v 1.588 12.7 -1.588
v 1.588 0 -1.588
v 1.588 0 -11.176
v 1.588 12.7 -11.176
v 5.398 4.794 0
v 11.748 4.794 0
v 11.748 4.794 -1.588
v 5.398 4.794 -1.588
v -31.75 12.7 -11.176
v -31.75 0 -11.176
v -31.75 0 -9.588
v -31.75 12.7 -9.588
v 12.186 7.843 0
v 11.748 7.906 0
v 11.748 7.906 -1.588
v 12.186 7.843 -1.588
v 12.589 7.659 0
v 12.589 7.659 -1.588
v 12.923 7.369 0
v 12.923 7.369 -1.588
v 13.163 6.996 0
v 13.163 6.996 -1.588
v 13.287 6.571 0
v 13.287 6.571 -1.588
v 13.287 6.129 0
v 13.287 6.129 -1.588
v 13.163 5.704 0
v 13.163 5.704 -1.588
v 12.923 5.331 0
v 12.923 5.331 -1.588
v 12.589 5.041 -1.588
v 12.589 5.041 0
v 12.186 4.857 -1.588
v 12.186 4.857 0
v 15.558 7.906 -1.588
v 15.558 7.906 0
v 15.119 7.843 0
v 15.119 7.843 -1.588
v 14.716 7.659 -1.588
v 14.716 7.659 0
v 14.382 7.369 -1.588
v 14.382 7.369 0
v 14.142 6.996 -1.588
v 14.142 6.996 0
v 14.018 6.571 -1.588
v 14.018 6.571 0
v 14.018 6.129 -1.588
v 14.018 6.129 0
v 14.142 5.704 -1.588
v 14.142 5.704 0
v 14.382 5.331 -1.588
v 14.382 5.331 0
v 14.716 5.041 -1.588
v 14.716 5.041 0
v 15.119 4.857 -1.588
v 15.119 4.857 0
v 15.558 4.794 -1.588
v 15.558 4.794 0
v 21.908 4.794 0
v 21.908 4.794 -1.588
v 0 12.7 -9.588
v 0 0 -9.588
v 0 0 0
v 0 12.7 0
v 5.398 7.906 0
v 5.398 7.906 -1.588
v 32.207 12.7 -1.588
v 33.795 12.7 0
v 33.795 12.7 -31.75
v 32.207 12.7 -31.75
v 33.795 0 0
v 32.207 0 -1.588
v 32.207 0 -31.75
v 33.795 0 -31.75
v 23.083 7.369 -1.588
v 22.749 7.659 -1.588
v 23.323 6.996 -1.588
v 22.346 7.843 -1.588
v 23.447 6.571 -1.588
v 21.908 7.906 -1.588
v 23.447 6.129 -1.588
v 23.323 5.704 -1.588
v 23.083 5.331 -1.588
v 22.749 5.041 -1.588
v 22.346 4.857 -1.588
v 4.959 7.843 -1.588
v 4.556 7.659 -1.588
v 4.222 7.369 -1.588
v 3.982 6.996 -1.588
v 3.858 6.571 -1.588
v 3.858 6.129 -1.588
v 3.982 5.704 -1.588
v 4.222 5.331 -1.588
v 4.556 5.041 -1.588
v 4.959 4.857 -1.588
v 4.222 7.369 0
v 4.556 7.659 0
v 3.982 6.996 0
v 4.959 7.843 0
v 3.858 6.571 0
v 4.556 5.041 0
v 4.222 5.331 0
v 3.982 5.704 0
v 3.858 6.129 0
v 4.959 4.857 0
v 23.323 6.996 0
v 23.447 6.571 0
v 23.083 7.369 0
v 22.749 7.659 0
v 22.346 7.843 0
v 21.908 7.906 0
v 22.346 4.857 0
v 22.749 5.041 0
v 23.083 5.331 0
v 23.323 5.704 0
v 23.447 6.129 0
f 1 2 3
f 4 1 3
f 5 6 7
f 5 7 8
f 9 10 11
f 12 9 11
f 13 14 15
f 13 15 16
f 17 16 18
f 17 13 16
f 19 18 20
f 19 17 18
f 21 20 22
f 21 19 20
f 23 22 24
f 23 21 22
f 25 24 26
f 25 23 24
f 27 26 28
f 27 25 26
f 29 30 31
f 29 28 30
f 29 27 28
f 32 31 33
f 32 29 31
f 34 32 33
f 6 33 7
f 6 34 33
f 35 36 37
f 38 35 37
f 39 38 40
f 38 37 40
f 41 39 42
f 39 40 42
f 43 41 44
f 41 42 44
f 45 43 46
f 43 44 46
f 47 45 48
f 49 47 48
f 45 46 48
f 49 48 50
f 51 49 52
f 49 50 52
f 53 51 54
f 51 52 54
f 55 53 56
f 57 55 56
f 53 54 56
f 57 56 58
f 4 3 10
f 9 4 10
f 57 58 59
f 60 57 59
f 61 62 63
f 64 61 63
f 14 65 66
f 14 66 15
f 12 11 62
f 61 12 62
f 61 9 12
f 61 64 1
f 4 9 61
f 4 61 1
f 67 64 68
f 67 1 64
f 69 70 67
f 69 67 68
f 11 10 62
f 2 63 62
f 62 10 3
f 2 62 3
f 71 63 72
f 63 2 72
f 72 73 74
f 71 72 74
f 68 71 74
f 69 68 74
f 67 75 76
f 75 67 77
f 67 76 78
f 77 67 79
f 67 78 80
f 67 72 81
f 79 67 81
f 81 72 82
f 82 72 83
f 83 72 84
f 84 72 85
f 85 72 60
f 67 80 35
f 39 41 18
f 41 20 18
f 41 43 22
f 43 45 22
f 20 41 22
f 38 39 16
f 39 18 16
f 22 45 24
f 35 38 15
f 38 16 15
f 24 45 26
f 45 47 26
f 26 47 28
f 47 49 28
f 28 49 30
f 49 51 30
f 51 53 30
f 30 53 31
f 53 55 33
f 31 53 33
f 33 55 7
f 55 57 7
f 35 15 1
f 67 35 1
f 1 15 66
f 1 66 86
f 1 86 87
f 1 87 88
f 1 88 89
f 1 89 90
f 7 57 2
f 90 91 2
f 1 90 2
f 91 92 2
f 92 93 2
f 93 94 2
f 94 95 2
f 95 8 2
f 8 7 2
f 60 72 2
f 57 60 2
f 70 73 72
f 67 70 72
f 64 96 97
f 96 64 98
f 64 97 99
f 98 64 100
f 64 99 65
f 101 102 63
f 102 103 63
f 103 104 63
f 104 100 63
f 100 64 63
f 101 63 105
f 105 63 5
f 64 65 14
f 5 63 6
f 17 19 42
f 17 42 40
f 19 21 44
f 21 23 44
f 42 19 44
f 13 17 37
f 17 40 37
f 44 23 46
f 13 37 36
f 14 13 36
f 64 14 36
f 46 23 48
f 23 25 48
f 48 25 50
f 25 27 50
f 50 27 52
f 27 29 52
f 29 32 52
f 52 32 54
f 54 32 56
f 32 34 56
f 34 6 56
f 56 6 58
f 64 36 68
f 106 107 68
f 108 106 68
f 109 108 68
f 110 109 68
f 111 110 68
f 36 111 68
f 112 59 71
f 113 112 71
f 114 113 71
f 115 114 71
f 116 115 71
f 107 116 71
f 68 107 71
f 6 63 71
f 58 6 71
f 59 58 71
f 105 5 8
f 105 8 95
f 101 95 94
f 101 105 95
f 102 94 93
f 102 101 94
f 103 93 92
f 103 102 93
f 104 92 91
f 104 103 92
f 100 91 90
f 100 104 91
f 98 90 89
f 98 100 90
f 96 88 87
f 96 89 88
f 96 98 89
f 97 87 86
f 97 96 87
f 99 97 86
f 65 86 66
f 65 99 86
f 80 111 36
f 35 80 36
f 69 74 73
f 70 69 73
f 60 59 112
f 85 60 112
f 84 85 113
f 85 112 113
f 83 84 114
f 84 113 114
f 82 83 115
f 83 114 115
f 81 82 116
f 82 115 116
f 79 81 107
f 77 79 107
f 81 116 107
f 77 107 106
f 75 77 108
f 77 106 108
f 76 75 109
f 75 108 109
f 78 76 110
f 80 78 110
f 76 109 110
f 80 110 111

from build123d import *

# Parameters (mm, degrees)
BOSS_EXTRUDE1_DEPTH = 12.7
CUT_EXTRUDE1_DEPTH  = 32.75


with BuildPart() as part:
    # Sketch1 → Boss-Extrude1 (new body)
    with BuildSketch(Plane(origin=(0, 0, 0), x_dir=(1, 0, 0), z_dir=(0, 1, 0))):
        Polygon((0, 0), (33.7947, 0), (33.7947, 1.5875), (33.7947, 31.75), (32.2072, 31.75), (32.2072, 1.5875), (1.5875, 1.5875), (1.5875, 11.176), (0, 11.176), (-31.75, 11.176), (-31.75, 9.5885), (0, 9.5885), (0, 1.5875), align=None)
    extrude(amount=BOSS_EXTRUDE1_DEPTH)

    # Sketch2 → Cut-Extrude1 (cut, through all)
    with BuildSketch(Plane.XY):
        with BuildLine():
            Line((5.3975, 7.90575), (11.7475, 7.90575))
            ThreePointArc((11.7475, 7.90575), (13.30325, 6.35), (11.7475, 4.79425))
            Line((11.7475, 4.79425), (5.3975, 4.79425))
            ThreePointArc((5.3975, 4.79425), (3.84175, 6.35), (5.3975, 7.90575))
        make_face()
        with BuildLine():
            Line((21.9075, 7.90575), (15.5575, 7.90575))
            ThreePointArc((15.5575, 7.90575), (14.00175, 6.35), (15.5575, 4.79425))
            Line((15.5575, 4.79425), (21.9075, 4.79425))
            ThreePointArc((21.9075, 4.79425), (23.46325, 6.35), (21.9075, 7.90575))
        make_face()
    extrude(amount=-CUT_EXTRUDE1_DEPTH, mode=Mode.SUBTRACT)


solid = part.part
